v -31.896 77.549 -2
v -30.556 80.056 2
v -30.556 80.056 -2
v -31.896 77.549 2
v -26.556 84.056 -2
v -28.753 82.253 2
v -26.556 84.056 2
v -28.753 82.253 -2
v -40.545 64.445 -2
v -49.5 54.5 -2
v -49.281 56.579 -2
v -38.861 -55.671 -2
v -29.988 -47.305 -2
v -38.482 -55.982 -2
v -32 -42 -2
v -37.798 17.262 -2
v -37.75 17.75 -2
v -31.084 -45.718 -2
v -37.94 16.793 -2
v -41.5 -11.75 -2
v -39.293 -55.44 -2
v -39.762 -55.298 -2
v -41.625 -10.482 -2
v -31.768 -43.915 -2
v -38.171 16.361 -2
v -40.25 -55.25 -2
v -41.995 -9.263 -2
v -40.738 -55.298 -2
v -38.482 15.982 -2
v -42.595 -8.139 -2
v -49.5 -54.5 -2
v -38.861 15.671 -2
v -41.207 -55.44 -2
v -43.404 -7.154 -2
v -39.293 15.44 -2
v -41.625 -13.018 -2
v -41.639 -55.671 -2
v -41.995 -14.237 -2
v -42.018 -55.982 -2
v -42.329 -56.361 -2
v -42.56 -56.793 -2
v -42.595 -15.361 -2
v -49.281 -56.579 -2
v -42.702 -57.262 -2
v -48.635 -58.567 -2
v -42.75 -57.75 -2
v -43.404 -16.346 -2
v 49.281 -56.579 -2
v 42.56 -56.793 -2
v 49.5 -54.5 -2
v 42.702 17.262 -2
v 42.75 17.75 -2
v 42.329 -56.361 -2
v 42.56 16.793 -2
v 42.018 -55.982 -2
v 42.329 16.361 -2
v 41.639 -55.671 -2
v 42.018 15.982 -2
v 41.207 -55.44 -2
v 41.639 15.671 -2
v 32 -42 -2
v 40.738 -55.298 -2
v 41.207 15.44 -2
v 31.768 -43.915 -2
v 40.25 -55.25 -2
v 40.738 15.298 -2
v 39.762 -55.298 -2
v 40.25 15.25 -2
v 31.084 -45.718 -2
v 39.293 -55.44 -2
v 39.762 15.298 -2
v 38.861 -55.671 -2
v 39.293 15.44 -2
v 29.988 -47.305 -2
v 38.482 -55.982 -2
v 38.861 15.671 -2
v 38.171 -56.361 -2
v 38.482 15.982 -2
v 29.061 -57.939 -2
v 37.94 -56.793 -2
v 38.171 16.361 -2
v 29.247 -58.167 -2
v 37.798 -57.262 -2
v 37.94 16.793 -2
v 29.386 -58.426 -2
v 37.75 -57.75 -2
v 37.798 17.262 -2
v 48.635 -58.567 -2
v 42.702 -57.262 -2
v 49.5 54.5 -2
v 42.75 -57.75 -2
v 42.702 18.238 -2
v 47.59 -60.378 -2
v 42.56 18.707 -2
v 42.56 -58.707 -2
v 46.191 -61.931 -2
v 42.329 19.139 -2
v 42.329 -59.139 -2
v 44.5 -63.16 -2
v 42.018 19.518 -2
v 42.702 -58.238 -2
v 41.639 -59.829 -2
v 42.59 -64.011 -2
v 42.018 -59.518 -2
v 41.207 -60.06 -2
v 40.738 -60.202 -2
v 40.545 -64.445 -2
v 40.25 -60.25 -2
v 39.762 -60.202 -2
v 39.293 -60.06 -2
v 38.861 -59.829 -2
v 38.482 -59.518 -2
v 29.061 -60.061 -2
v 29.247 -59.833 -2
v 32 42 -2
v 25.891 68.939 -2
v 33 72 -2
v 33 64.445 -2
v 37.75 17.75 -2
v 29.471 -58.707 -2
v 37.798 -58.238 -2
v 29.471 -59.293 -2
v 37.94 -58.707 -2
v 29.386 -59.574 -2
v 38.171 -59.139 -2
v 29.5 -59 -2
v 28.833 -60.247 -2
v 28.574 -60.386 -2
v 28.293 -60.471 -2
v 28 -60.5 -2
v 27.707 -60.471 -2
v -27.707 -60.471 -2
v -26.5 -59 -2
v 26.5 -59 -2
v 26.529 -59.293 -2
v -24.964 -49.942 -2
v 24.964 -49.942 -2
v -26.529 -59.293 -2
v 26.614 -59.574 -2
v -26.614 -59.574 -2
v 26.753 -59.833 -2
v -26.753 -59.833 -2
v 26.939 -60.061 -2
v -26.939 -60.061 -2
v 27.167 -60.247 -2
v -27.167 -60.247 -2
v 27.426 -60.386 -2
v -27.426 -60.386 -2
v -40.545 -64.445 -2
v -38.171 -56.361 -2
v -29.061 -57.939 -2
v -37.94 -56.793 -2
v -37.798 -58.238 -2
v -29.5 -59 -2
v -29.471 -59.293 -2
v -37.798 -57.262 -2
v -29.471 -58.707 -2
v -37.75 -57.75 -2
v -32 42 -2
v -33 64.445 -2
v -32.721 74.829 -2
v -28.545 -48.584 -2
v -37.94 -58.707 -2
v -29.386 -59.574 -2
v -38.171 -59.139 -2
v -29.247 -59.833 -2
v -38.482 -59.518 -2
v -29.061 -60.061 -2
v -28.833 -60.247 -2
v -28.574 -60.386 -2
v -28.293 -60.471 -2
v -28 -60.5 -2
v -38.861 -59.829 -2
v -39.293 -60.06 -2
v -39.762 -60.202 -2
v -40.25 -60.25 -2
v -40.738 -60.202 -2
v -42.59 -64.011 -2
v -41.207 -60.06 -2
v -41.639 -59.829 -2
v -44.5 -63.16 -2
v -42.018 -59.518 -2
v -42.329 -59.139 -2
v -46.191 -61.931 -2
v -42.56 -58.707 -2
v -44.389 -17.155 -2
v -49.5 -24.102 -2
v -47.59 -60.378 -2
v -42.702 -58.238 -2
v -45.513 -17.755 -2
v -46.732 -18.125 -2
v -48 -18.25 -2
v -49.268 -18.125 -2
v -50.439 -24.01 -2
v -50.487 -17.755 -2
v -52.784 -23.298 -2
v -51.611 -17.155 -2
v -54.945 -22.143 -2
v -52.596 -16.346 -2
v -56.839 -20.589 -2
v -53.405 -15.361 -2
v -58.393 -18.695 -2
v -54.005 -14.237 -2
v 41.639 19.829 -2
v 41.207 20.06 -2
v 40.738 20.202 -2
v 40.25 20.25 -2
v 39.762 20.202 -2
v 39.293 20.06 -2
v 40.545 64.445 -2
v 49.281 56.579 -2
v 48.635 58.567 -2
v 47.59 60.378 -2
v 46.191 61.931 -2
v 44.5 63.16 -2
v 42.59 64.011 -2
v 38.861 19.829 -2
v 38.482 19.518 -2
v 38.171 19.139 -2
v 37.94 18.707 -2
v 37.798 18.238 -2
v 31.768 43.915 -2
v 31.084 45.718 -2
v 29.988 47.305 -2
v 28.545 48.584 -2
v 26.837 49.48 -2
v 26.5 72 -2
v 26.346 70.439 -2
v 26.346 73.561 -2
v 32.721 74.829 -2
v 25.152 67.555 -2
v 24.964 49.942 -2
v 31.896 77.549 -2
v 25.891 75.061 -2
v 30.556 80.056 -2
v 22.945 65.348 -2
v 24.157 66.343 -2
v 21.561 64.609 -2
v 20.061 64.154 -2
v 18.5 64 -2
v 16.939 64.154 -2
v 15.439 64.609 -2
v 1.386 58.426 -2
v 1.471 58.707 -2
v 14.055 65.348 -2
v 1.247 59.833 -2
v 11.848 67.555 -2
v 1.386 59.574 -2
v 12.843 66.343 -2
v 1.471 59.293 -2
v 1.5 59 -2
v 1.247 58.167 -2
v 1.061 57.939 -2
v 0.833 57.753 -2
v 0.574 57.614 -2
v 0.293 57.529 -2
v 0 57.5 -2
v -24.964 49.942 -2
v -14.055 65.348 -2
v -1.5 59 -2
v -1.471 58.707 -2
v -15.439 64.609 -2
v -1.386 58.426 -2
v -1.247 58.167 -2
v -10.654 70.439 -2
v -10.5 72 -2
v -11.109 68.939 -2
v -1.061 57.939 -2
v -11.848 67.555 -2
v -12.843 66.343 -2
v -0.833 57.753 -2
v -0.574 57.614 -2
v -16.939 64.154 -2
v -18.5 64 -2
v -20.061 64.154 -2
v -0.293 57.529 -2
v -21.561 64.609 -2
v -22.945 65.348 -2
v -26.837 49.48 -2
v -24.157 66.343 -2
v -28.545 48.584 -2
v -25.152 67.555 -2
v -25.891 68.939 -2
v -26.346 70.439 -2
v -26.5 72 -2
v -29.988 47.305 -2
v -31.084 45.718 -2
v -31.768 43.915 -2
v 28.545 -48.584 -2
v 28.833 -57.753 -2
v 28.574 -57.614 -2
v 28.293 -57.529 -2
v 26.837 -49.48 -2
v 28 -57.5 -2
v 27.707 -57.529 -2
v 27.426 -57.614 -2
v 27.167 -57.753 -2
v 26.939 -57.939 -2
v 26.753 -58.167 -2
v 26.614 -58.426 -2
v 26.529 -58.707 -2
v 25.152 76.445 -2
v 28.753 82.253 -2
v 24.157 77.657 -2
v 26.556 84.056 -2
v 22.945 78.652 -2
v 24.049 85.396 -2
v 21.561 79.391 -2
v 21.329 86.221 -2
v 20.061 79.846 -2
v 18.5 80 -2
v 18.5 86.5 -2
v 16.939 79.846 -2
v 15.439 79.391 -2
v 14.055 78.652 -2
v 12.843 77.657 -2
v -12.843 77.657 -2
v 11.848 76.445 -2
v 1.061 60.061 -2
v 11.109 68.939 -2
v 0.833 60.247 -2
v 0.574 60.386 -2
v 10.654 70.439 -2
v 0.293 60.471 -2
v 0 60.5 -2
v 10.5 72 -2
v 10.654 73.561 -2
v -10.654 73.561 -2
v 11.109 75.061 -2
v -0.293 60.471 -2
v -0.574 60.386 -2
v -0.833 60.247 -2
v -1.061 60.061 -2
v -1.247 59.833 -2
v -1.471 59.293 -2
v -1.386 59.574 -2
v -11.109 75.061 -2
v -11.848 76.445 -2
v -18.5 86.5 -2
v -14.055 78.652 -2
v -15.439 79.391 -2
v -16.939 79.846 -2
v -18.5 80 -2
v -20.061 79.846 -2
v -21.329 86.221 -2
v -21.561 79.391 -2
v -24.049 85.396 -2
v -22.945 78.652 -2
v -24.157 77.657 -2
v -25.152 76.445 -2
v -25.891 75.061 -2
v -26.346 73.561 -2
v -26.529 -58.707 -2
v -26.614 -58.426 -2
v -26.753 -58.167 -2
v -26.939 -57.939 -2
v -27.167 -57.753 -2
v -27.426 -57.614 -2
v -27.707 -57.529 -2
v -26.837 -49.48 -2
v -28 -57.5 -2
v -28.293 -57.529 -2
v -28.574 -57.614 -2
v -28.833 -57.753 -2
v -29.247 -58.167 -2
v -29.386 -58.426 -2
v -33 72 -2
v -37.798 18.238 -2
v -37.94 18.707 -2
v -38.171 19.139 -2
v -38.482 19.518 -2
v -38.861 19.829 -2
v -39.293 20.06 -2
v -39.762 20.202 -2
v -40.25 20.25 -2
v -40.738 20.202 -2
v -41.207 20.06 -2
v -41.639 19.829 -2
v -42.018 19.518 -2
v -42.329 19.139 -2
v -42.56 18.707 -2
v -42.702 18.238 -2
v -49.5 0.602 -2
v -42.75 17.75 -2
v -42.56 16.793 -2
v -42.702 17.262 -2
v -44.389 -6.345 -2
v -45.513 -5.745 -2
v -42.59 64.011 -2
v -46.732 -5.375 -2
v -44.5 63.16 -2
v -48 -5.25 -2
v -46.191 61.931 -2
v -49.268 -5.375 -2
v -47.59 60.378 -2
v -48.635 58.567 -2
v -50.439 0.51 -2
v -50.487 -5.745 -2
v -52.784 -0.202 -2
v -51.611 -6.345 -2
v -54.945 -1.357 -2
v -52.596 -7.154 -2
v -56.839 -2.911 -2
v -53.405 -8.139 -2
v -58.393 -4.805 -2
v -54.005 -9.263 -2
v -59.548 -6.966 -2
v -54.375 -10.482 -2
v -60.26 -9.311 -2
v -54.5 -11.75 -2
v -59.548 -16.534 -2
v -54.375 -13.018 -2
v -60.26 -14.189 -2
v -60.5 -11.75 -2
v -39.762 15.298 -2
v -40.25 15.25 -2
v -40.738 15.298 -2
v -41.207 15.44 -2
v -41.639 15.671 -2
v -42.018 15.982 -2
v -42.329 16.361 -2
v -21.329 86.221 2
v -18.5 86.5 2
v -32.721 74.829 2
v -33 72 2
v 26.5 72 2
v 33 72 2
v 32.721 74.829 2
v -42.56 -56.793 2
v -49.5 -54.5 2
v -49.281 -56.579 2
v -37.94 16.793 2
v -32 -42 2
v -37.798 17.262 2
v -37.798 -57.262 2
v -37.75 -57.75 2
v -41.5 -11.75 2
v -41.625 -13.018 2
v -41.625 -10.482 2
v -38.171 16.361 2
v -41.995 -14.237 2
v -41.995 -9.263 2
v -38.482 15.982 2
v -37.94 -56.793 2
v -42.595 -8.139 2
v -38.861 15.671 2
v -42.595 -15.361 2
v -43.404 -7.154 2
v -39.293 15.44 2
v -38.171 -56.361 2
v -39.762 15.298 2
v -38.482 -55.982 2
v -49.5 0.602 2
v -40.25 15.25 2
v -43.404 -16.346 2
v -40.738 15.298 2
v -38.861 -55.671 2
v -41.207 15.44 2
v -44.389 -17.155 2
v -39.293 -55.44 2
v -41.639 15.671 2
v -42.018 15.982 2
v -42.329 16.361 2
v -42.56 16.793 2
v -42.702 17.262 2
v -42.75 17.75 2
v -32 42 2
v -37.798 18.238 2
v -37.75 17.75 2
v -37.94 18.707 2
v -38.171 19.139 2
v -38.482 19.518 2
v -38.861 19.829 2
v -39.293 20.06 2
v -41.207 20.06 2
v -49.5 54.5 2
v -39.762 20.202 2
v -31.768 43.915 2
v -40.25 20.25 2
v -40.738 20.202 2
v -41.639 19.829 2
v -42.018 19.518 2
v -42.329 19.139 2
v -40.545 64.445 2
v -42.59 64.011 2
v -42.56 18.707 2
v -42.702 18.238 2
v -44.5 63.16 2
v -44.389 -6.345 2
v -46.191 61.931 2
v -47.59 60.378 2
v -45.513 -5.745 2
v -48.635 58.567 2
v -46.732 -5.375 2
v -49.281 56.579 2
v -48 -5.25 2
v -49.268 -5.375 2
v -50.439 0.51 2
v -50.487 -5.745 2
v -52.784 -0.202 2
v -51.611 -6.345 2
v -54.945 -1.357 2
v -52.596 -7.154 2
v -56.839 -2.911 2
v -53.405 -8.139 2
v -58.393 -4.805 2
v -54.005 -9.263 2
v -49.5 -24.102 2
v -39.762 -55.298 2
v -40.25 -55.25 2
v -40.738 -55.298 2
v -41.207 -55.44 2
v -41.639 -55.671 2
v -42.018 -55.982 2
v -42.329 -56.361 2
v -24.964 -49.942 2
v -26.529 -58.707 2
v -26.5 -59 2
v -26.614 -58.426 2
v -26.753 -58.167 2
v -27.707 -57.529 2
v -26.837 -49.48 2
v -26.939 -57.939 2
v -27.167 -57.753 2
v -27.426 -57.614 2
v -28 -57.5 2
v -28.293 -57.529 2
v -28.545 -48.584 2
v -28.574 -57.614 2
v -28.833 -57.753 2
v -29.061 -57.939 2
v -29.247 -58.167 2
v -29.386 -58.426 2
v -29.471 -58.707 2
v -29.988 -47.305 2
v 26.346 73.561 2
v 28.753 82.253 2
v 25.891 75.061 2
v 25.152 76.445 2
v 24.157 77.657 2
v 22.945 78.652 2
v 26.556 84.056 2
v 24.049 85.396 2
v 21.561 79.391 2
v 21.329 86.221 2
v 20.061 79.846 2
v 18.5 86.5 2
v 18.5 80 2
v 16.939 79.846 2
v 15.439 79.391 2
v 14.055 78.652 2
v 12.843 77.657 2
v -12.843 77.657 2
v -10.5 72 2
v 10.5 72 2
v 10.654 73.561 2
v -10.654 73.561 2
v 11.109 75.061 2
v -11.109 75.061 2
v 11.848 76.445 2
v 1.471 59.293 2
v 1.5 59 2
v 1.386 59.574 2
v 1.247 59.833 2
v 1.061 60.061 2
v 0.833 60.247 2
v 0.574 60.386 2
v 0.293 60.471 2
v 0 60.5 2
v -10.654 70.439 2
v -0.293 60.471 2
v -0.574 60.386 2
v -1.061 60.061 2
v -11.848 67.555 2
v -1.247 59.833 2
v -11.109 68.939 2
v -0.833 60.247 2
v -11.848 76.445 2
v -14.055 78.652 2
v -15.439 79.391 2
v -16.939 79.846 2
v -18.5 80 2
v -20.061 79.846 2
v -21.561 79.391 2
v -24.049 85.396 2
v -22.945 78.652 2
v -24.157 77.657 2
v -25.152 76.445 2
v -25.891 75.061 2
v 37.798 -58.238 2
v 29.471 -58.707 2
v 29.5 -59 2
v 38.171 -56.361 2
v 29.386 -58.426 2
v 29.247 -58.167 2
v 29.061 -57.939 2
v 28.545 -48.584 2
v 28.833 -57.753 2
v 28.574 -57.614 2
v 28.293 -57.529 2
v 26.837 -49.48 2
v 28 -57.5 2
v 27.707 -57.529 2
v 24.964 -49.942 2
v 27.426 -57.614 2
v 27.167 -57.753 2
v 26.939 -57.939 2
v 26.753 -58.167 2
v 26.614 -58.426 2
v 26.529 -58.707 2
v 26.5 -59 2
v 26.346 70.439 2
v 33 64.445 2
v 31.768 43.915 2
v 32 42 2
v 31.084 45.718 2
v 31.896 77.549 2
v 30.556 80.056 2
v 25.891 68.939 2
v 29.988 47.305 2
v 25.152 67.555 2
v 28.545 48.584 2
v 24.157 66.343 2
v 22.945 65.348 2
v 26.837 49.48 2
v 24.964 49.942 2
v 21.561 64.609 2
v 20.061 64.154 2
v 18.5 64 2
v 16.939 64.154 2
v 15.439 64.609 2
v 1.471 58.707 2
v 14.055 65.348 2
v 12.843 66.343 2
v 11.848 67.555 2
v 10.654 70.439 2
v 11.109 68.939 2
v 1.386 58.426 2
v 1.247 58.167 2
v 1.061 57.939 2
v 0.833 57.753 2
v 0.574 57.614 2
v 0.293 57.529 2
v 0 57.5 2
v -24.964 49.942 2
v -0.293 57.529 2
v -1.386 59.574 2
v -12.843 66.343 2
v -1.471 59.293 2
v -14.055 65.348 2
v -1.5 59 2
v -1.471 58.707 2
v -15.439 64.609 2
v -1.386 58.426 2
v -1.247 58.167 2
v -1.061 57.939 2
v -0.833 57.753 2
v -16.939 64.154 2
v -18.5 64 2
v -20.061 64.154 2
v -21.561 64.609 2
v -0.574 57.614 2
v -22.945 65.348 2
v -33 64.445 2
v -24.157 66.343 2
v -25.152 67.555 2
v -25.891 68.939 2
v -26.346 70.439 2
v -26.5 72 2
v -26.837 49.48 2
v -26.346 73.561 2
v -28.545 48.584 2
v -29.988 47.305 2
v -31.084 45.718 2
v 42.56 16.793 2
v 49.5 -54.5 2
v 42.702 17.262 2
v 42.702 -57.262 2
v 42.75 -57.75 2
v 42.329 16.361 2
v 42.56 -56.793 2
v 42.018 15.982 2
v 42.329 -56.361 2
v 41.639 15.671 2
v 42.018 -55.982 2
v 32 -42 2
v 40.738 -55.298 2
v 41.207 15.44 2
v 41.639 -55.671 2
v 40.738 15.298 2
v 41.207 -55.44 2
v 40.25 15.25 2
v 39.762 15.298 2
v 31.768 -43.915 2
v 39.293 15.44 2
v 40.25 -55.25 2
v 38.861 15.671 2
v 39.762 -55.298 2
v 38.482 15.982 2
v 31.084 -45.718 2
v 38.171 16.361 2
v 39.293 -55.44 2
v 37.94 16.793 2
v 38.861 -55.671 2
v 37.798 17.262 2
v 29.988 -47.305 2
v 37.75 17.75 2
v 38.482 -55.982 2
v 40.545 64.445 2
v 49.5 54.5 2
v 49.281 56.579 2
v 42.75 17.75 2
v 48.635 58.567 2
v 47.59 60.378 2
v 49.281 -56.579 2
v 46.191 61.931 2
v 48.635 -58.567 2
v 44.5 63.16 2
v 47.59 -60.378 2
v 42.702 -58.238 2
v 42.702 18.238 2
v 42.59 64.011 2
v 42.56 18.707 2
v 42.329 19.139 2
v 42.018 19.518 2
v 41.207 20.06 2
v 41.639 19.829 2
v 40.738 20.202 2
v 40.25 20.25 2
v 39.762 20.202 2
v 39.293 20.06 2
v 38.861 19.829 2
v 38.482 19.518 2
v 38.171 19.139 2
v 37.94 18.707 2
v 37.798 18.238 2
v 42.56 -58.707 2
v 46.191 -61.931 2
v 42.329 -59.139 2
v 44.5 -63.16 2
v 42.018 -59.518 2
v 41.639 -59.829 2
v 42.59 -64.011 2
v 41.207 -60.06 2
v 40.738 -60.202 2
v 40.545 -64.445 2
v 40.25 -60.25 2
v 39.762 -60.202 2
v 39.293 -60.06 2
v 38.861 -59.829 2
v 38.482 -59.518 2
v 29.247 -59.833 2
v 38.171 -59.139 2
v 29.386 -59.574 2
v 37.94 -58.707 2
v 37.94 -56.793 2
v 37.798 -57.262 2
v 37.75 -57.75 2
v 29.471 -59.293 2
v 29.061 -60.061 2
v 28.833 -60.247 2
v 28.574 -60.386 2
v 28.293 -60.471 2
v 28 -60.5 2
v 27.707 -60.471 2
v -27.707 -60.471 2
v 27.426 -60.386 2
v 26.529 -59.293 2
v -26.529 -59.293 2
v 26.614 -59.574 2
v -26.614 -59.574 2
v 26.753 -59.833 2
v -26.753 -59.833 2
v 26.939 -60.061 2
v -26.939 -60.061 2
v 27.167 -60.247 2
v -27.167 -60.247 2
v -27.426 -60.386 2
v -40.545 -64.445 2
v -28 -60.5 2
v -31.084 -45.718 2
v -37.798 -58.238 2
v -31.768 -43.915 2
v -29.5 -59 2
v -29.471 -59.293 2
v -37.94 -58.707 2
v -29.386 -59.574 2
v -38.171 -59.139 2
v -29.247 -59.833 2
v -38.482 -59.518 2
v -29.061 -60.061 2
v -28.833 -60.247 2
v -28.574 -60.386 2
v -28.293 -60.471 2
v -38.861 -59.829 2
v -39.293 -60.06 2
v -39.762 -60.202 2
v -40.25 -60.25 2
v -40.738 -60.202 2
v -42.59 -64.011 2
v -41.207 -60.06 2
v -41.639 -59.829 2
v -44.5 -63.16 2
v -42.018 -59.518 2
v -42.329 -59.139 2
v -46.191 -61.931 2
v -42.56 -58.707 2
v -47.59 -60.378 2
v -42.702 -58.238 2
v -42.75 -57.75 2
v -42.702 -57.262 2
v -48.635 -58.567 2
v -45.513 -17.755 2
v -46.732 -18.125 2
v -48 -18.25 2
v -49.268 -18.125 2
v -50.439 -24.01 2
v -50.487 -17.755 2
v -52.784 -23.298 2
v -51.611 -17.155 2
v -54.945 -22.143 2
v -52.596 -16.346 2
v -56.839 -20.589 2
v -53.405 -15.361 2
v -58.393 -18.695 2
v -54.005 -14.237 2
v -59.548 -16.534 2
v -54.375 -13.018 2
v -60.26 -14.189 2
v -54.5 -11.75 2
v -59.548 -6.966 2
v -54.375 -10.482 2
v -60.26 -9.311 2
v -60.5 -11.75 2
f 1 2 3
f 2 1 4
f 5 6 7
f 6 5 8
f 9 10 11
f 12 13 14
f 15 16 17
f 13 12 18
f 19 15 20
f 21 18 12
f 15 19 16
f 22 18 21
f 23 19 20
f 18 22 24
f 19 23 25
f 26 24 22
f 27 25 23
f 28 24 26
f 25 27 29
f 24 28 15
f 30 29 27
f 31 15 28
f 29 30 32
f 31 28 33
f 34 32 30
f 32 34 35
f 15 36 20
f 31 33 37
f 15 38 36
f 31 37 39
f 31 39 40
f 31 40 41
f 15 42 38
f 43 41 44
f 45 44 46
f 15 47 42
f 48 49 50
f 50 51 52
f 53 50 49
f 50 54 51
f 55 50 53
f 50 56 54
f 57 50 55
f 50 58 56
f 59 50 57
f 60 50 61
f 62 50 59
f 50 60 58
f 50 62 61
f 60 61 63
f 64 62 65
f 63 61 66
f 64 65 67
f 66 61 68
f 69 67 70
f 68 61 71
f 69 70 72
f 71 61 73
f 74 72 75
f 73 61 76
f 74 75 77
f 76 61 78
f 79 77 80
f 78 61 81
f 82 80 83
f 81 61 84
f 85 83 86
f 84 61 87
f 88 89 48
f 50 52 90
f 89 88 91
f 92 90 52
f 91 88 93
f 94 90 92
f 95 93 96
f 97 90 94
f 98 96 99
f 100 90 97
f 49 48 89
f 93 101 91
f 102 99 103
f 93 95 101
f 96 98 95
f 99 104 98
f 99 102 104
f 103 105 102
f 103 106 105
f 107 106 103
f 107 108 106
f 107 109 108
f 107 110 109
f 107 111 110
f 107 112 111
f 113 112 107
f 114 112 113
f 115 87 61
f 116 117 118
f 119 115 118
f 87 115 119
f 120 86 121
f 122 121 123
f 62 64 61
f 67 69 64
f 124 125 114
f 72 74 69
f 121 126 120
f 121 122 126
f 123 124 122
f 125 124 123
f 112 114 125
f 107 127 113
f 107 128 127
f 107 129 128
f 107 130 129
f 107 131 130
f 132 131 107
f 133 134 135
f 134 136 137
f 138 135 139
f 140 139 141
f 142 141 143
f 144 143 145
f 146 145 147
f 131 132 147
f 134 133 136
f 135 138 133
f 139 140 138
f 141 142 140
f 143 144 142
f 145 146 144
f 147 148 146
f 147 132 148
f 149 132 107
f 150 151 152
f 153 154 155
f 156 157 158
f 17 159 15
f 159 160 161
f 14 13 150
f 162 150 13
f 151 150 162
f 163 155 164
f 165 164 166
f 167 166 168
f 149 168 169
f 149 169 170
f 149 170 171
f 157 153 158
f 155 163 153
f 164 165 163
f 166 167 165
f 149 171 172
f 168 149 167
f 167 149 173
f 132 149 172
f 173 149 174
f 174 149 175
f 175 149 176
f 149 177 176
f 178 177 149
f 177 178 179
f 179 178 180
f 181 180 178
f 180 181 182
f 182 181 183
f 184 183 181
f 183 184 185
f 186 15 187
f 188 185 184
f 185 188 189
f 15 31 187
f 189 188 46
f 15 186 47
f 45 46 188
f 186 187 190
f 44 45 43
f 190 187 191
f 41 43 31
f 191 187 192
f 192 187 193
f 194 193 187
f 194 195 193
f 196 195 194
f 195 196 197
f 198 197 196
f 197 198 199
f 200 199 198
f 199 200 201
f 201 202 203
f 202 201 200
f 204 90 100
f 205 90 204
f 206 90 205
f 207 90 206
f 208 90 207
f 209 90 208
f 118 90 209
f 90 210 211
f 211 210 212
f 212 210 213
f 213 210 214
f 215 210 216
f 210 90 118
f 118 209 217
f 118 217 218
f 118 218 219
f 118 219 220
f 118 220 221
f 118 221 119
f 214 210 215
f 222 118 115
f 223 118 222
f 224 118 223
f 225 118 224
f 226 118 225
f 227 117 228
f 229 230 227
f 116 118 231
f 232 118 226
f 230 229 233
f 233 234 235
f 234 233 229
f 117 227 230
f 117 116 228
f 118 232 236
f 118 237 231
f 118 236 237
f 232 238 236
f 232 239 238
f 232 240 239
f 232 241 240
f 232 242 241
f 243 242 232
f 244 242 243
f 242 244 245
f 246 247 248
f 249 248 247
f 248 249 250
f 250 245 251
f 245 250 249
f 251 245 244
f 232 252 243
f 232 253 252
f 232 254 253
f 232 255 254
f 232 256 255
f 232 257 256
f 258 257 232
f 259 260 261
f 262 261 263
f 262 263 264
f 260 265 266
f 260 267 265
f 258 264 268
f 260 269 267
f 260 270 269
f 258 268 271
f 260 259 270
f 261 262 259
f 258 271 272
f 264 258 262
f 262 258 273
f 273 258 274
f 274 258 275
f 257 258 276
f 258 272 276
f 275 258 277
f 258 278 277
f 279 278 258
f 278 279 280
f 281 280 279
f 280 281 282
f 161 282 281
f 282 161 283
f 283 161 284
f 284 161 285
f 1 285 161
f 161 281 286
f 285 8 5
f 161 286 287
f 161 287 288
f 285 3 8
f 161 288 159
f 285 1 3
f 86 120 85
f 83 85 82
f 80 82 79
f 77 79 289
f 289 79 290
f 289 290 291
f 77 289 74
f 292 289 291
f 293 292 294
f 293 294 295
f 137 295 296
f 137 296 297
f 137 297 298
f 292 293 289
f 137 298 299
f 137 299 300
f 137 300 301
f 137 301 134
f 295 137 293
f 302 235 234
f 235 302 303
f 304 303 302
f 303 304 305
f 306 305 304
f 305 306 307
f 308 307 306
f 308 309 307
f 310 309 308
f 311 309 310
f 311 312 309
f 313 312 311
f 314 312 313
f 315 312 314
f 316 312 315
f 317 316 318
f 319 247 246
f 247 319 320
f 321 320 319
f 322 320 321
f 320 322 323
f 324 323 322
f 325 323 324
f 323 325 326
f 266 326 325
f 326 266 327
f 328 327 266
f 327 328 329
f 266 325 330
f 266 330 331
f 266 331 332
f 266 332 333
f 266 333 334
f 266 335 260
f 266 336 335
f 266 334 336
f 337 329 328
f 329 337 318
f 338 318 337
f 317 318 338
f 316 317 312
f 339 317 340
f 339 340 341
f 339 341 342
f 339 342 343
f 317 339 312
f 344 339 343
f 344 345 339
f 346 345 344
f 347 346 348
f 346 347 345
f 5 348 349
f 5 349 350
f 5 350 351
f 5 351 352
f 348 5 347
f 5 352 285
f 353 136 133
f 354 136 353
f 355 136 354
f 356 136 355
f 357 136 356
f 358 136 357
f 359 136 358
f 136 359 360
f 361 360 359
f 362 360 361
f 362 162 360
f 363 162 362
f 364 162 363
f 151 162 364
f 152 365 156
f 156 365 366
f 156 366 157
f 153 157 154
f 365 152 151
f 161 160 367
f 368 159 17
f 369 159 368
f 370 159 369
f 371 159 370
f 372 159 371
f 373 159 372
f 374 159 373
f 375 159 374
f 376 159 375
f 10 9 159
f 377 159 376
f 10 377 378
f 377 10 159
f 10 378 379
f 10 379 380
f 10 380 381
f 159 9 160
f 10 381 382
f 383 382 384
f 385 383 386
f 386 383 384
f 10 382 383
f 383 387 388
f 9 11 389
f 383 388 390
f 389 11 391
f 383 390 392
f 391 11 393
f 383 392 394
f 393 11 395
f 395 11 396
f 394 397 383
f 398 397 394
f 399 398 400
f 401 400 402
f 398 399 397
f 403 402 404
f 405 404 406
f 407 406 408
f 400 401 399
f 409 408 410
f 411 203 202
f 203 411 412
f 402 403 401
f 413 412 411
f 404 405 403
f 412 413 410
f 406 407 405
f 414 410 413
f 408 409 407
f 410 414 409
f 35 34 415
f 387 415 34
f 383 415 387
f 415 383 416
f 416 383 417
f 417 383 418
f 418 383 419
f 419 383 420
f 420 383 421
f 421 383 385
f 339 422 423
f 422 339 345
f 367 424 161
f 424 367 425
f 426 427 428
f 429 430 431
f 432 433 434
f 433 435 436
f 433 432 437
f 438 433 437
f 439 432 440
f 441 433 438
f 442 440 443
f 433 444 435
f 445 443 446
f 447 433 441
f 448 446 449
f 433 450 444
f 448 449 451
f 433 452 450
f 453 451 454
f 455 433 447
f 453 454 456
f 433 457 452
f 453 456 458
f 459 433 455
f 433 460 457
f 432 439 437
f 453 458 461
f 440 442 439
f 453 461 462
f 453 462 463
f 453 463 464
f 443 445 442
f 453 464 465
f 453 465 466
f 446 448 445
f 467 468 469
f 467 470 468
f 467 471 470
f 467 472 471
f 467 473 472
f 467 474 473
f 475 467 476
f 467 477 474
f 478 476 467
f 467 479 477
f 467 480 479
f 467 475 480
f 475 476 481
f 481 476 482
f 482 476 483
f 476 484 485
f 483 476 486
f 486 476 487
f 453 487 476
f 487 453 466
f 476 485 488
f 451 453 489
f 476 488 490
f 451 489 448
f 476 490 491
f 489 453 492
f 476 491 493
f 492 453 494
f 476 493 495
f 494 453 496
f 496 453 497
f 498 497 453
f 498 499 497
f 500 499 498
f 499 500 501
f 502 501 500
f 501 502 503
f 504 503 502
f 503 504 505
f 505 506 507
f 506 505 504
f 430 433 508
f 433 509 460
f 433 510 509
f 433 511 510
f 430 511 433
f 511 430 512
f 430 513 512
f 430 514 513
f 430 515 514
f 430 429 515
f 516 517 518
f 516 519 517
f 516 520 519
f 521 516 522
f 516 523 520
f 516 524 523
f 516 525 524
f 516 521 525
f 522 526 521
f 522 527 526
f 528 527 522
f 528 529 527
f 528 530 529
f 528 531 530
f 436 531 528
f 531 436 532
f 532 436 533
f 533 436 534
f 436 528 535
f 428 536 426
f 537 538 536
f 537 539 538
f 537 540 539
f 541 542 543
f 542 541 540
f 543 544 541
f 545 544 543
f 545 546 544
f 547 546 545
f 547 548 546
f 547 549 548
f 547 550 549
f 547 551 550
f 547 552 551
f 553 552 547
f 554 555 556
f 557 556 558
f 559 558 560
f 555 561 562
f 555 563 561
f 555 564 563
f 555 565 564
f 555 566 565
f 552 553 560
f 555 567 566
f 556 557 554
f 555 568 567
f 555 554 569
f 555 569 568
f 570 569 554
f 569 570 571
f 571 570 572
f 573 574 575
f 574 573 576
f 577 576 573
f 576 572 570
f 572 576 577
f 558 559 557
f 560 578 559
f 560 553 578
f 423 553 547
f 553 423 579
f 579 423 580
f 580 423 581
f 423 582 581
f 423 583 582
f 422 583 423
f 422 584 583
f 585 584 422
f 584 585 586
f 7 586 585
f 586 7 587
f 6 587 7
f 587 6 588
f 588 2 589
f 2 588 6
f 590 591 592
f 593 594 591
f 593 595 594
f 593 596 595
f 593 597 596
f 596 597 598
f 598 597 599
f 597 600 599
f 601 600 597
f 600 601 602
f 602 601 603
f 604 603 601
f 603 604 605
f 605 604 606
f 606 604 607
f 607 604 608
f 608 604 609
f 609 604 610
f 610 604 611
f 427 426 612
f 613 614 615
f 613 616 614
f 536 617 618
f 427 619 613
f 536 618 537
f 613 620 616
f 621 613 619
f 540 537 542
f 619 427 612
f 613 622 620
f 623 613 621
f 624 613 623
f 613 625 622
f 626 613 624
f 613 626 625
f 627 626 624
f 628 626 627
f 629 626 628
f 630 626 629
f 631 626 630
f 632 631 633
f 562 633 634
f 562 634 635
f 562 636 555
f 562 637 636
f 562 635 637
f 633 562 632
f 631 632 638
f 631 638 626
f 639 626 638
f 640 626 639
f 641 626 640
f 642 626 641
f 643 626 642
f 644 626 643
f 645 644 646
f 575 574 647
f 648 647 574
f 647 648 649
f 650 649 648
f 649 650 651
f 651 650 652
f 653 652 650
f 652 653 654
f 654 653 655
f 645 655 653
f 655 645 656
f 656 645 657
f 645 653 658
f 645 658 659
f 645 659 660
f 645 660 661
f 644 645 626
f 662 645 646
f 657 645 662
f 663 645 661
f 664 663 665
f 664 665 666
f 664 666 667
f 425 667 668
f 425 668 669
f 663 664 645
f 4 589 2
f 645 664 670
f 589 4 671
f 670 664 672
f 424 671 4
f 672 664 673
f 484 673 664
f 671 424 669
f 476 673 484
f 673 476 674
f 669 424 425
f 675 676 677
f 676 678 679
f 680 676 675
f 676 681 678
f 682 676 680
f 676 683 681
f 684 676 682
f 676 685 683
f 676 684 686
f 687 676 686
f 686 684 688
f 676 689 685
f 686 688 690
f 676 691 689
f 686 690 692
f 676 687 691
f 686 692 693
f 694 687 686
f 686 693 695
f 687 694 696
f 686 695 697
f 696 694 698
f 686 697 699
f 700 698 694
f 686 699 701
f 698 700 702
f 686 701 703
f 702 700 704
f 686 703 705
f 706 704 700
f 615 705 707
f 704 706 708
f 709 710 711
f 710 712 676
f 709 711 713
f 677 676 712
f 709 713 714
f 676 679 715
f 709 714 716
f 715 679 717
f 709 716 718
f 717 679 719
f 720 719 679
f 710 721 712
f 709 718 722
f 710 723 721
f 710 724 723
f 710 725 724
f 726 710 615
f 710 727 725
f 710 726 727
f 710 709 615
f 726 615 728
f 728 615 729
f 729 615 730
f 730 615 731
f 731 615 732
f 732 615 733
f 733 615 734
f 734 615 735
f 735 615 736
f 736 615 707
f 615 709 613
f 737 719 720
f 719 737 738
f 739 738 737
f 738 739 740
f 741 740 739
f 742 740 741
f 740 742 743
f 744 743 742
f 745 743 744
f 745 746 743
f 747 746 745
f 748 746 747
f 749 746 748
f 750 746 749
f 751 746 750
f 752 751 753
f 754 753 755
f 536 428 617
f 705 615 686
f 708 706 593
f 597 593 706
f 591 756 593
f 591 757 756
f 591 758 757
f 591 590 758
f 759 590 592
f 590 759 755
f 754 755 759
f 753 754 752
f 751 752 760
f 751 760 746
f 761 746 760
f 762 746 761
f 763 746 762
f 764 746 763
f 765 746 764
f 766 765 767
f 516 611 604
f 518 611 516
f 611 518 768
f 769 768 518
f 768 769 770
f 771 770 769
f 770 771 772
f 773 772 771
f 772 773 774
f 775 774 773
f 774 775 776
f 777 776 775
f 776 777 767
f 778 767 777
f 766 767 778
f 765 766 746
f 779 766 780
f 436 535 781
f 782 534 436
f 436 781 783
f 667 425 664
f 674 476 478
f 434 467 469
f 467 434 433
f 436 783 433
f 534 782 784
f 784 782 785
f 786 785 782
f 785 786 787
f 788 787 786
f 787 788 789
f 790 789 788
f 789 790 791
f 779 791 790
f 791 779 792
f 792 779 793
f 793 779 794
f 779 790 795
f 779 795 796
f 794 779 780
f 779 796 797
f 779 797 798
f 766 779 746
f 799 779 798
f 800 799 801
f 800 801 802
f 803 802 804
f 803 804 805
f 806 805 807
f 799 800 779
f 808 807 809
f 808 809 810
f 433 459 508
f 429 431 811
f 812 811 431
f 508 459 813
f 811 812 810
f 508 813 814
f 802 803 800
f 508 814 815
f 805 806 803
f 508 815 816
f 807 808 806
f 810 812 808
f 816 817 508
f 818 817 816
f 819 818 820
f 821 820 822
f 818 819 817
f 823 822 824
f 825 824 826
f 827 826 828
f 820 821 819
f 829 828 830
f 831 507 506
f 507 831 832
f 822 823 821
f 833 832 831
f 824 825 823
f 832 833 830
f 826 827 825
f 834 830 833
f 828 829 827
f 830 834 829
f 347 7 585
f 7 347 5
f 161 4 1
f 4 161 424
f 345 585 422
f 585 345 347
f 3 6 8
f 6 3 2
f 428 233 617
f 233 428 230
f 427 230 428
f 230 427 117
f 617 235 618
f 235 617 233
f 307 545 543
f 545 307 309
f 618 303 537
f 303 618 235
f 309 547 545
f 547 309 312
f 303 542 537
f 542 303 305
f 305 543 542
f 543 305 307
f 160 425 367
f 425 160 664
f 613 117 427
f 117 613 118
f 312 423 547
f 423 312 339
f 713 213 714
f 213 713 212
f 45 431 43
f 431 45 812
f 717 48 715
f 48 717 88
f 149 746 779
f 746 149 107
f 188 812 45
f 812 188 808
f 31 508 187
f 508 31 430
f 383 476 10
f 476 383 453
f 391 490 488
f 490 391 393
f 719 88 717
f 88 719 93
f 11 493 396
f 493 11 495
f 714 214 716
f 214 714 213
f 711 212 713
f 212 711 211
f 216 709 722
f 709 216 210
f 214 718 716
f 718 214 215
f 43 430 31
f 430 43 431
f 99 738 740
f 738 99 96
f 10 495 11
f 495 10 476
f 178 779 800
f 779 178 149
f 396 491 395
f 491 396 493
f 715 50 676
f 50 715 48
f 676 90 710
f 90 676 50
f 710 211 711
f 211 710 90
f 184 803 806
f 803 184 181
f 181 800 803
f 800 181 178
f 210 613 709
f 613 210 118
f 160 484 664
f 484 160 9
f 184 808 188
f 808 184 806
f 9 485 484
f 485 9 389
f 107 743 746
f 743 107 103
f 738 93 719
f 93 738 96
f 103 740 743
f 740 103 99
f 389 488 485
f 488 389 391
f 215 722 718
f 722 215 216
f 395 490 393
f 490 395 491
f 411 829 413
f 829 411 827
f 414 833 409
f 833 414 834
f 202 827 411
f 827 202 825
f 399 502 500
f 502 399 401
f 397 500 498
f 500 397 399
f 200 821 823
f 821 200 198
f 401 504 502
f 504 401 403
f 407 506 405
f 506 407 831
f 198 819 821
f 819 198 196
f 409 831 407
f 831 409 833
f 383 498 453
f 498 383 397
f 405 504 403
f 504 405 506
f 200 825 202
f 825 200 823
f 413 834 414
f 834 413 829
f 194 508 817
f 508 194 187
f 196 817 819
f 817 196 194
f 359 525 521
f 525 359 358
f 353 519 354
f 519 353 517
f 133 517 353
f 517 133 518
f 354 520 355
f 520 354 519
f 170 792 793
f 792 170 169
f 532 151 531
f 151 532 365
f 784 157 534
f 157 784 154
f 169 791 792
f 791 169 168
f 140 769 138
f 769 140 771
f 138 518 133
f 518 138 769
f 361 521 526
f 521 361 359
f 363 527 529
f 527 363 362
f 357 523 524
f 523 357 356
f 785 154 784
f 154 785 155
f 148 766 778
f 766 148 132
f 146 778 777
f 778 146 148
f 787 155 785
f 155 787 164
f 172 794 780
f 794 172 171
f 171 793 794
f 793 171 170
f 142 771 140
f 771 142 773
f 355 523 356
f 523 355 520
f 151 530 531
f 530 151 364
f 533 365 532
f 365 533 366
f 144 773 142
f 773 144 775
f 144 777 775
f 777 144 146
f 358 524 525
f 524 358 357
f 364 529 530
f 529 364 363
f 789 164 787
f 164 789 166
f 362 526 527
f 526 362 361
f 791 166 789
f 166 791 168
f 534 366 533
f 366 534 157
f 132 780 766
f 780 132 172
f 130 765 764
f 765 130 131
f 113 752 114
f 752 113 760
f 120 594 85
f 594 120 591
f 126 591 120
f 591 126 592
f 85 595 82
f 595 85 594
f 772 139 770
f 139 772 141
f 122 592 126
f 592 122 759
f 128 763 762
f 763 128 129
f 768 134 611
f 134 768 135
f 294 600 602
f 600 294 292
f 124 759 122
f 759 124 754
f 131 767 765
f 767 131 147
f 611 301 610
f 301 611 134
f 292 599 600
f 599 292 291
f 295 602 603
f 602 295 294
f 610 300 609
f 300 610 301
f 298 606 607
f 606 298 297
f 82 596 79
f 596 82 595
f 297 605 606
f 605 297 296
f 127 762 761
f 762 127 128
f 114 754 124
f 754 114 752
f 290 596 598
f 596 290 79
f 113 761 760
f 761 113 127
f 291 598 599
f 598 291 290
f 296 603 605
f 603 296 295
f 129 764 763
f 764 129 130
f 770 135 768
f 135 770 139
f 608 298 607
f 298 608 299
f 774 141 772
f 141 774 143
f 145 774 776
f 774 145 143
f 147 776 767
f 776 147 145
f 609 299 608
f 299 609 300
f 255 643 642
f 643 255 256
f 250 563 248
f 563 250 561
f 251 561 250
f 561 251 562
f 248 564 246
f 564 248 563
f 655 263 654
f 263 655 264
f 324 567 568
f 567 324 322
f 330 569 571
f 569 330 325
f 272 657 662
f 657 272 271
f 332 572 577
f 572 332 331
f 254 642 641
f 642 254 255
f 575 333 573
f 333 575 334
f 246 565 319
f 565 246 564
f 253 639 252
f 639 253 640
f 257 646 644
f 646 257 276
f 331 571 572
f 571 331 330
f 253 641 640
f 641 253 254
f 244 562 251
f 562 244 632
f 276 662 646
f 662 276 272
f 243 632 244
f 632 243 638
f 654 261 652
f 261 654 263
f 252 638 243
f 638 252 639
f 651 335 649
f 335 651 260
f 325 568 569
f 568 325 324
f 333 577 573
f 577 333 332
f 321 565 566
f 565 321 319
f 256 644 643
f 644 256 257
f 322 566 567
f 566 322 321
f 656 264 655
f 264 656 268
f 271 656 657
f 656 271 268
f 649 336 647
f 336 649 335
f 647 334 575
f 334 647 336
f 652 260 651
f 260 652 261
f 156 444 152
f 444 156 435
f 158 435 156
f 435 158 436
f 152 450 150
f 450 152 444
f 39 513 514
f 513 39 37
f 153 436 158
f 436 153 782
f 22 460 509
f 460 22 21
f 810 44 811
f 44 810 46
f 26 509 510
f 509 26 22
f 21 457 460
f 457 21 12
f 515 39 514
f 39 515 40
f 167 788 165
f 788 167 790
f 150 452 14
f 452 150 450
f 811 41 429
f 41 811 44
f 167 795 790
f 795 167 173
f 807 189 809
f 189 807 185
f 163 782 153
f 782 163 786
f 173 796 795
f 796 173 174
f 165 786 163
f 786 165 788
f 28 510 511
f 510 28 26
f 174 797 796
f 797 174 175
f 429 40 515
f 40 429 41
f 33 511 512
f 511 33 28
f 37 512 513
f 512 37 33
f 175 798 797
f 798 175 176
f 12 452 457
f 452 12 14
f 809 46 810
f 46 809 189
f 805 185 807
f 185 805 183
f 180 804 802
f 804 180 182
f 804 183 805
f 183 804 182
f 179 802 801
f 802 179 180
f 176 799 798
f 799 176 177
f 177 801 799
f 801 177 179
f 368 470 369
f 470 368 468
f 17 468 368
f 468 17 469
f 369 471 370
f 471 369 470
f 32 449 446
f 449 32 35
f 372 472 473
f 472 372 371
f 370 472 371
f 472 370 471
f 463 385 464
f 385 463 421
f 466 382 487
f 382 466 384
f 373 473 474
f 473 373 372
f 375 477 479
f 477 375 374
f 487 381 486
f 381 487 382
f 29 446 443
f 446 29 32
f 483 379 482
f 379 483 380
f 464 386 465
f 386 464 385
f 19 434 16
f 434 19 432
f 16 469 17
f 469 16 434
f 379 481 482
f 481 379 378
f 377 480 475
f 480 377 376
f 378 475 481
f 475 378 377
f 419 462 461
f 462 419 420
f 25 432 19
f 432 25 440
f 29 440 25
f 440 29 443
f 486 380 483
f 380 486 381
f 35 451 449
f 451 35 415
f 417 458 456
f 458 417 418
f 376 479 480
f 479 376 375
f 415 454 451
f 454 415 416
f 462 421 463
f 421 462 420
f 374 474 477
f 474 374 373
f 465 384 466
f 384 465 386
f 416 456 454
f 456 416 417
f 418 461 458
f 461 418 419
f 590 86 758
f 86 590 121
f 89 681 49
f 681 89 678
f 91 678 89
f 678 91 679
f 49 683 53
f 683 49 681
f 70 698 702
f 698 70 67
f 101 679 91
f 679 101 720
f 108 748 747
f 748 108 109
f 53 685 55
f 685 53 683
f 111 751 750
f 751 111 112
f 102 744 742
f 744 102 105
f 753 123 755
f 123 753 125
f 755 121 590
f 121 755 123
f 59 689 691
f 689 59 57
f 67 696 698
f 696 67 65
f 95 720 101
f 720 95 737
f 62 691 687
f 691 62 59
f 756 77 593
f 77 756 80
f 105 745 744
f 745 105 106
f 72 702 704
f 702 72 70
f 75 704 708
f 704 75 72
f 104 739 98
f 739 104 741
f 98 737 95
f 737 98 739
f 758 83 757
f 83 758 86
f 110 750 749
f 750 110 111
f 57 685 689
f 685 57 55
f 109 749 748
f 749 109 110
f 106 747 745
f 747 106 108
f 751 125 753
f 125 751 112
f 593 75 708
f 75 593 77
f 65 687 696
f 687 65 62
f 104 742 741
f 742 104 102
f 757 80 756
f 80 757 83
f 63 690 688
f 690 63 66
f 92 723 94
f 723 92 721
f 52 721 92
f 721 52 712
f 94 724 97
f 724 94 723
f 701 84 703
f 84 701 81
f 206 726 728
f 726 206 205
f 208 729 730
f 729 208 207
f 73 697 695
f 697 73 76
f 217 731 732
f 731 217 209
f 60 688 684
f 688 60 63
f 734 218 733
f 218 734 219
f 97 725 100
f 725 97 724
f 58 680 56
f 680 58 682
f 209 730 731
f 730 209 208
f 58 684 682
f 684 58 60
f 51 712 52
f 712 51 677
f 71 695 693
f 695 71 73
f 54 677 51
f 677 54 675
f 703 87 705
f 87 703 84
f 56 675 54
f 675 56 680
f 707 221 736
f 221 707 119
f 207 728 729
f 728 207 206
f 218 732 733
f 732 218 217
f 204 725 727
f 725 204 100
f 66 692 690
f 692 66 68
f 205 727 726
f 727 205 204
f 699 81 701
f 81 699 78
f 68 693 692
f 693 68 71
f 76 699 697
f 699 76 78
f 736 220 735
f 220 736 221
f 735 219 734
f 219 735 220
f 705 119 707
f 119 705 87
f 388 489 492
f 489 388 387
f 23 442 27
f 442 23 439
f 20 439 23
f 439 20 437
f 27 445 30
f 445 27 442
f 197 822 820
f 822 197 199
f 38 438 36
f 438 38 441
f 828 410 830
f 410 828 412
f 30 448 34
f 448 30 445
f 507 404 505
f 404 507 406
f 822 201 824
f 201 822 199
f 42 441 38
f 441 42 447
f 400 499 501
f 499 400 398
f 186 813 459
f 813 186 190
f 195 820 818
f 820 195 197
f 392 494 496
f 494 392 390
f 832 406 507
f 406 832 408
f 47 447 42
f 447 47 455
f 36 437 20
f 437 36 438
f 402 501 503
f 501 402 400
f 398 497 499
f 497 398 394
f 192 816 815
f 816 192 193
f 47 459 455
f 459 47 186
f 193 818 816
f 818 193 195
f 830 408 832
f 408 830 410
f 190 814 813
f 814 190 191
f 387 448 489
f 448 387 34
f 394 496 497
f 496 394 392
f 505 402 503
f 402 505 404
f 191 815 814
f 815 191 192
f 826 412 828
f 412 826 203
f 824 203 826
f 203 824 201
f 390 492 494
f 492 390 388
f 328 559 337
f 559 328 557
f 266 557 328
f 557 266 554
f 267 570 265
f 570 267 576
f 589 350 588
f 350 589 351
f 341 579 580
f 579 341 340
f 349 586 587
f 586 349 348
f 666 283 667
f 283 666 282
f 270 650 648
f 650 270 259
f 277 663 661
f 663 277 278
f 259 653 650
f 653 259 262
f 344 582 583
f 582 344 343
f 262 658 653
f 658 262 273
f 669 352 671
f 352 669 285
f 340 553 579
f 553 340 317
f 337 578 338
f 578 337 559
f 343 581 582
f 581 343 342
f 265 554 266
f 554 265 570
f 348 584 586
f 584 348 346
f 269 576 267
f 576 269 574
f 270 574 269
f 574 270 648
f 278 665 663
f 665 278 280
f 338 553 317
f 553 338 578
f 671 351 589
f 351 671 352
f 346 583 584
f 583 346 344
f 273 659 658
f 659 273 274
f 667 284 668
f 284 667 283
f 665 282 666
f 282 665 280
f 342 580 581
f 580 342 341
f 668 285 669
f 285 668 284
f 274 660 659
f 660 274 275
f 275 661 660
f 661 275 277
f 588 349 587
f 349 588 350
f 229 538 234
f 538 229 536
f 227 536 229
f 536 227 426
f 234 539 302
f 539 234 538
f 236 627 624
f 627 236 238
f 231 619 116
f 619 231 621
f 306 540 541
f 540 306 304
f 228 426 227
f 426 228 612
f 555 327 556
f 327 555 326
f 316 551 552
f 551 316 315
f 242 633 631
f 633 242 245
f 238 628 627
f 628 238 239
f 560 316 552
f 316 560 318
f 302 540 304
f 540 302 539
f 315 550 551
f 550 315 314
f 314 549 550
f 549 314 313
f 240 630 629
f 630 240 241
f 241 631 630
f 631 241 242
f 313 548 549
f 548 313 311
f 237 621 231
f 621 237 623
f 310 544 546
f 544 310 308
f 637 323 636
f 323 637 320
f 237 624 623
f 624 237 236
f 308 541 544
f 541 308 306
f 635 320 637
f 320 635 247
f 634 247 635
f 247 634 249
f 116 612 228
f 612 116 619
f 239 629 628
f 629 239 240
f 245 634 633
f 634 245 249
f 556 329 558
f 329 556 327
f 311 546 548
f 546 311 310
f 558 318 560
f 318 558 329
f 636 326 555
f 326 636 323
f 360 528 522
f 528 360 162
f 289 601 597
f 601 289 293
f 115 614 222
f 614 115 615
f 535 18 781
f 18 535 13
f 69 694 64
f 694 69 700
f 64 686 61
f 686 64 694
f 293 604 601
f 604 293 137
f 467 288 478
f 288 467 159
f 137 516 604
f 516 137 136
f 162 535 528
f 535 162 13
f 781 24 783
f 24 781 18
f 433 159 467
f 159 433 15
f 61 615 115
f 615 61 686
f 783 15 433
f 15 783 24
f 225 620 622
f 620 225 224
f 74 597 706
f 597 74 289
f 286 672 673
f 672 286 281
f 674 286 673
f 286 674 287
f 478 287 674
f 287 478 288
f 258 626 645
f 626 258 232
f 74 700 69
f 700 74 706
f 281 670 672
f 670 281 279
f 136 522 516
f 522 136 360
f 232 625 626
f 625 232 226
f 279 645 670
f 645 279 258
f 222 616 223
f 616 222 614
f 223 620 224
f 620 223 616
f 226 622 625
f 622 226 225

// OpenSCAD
// reductor raster 52x80.5
// 80.5x75.5, rupe d=8 mm

// holder za inverter, senzor i buttone

// inverter rupe 118x56 3 rupe
// inverter kutija base 67x129 d=5 mm
// od gornje strane do senzora 32 mm, od sredine (80.5
// od sredine do senzora 48 mm

sensor_pos = [-48,80.5/2-32];
thick = 4;
move_up = 20;

btn_screw_dia  = 16; 
btn_outer_dia  = 19;
btn_holder_dia = 29;
btn_pos = [[-37/2,72],[37/2,72]];

module btn_holes()
{
  for(xy = btn_pos)
    translate(xy)
      cylinder(d=btn_screw_dia,h=thick+1,$fn=32,center=true);
}

module btn_holders()
{
  for(xy = btn_pos)
    translate(xy)
      cylinder(d=btn_holder_dia,h=thick,$fn=32,center=true);

  // straignth extension bottom
  bot_ext = 20;
  for(xy = btn_pos)
    translate(xy+[0,-bot_ext/2])
      cube([btn_holder_dia,bot_ext,thick],center=true);

  // bar between btns
  if(1)
  translate([0,btn_pos[0][1]])
  // cube([10,10,10],center=true);
  cube([-btn_pos[0][0]+btn_pos[1][0],btn_holder_dia,thick],center=true);

}

module sensor_hole()
{
  translate(sensor_pos)
    cylinder(d=13,h=thick+1,$fn=32,center=true);
}

module sensor_holder()
{
  translate(sensor_pos)
    cylinder(d=25,h=thick,$fn=32,center=true);
}

module inverter_holes()
{
  inverter_hole_list=[[-56/2,-118/2],[56/2,-118/2],[0,118/2]];
  for(xy = inverter_hole_list)
   translate(xy)
     cylinder(d=3,h=thick+1,$fn=32,center=true);
}

module reductor_holes()
{
  reductor_hole_raster = [80.5,75.5];
  for(i=[-1,1])
    for(j=[-1,1])
      translate([reductor_hole_raster[0]*i/2,reductor_hole_raster[1]*j/2])
        cylinder(d=5,h=thick+1,$fn=32,center=true);
}

module cut_center()
{
    base = [64,100,thick+1];
    rounding = 8;
    minkowski()
    {
      cube(base-[rounding*2,rounding*2,base[2]/2],center=true);
      cylinder(r=rounding,h=base[2]/2,center=true);
    }
}

module inverter_base()
{
  base = [99,129,thick];
  rounding = 10;
  difference()
  {
    union()
    {
      minkowski()
      {
        cube(base-[rounding*2,rounding*2,base[2]/2],center=true);
        cylinder(r=rounding,h=base[2]/2,center=true);
      }
      translate([0,-move_up,0])
        sensor_holder();
      btn_holders();
    }
    inverter_holes();
    translate([0,-move_up,0])
    {
      reductor_holes();
      sensor_hole();
    }
    cut_center();
    btn_holes();
  }
}


// projection()
inverter_base();
